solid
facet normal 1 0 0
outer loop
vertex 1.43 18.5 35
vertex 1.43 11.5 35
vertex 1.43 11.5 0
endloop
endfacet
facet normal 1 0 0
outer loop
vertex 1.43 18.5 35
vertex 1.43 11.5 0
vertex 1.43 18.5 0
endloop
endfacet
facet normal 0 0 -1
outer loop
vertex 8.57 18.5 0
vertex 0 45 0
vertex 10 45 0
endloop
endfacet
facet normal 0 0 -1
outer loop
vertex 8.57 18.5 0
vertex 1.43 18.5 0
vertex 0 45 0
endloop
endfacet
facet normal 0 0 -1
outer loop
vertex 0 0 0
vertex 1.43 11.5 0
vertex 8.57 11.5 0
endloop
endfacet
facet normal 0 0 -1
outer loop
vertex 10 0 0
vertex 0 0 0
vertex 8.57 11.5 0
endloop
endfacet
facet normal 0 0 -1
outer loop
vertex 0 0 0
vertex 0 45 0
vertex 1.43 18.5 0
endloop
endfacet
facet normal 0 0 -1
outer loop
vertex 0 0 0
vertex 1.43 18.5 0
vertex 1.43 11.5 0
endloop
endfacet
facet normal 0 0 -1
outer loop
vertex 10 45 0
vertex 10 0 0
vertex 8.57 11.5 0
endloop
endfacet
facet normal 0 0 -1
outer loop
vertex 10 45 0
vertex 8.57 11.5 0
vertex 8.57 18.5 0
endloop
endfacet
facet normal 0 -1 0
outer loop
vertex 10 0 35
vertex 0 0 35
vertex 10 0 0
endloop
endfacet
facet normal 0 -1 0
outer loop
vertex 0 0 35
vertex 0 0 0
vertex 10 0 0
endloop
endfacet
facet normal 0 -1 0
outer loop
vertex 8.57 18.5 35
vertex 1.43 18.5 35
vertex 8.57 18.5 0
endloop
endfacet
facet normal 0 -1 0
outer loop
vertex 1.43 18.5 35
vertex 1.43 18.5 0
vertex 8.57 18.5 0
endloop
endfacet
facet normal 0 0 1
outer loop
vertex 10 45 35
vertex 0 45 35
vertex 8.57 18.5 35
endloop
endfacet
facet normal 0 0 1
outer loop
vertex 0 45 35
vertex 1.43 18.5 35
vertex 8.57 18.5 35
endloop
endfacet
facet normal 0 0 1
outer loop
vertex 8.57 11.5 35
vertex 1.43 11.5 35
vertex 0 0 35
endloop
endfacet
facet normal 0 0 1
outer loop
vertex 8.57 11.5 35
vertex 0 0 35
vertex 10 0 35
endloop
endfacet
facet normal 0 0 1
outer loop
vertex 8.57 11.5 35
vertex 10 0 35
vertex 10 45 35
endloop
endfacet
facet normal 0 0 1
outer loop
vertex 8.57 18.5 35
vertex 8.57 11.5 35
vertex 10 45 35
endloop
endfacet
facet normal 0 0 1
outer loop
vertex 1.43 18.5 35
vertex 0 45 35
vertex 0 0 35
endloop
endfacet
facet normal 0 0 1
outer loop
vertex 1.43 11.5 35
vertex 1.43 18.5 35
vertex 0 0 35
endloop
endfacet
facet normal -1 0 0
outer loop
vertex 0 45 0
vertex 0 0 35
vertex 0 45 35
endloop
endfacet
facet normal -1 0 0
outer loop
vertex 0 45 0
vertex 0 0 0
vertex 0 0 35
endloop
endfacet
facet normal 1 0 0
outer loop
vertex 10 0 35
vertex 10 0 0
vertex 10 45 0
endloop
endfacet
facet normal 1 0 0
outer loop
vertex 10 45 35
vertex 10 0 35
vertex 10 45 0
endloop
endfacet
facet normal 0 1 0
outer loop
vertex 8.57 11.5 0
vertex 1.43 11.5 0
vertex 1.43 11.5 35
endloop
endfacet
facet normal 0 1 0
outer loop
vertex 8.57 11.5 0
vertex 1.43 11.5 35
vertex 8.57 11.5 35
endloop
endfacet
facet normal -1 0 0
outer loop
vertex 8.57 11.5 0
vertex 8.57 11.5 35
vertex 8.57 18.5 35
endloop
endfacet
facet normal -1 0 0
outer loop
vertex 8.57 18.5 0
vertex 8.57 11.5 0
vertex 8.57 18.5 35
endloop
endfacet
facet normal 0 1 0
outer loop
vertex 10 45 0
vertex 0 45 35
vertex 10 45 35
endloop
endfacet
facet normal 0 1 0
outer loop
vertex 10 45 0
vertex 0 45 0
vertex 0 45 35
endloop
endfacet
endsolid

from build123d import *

# Parameters (mm, degrees)
F0_W     = 10
F0_H     = 20
F1_DEPTH = 10
F2_W     = 7.14
F2_H     = 7
F3_DEPTH = 25
F4_DEPTH = 25
F5_DEPTH = 25


with BuildPart() as f1:
    # F0 (on Top) → F1 (new body)
    with BuildSketch(Plane.XY):
        with Locations((5, 10)):
            Rectangle(F0_W, F0_H)
    extrude(amount=F1_DEPTH)

    # F2 (on face) → F3 (cut)
    with BuildSketch(Plane.XY.offset(10)):
        with Locations((5, 15)):
            Rectangle(F2_W, F2_H)
    extrude(amount=-F3_DEPTH, mode=Mode.SUBTRACT)

    # F4 (add): a face of the model
    f4_faces = [f1.faces().sort_by_distance(p)[0] for p in [
        (5, 20, 5),
    ]]
    extrude(f4_faces, amount=F4_DEPTH)

    # F5 (add): a face of the model
    f5_faces = [f1.faces().sort_by_distance(p)[0] for p in [
        (5, 23.4370781461, 10),
    ]]
    extrude(f5_faces, amount=F5_DEPTH)


solid = f1.part
